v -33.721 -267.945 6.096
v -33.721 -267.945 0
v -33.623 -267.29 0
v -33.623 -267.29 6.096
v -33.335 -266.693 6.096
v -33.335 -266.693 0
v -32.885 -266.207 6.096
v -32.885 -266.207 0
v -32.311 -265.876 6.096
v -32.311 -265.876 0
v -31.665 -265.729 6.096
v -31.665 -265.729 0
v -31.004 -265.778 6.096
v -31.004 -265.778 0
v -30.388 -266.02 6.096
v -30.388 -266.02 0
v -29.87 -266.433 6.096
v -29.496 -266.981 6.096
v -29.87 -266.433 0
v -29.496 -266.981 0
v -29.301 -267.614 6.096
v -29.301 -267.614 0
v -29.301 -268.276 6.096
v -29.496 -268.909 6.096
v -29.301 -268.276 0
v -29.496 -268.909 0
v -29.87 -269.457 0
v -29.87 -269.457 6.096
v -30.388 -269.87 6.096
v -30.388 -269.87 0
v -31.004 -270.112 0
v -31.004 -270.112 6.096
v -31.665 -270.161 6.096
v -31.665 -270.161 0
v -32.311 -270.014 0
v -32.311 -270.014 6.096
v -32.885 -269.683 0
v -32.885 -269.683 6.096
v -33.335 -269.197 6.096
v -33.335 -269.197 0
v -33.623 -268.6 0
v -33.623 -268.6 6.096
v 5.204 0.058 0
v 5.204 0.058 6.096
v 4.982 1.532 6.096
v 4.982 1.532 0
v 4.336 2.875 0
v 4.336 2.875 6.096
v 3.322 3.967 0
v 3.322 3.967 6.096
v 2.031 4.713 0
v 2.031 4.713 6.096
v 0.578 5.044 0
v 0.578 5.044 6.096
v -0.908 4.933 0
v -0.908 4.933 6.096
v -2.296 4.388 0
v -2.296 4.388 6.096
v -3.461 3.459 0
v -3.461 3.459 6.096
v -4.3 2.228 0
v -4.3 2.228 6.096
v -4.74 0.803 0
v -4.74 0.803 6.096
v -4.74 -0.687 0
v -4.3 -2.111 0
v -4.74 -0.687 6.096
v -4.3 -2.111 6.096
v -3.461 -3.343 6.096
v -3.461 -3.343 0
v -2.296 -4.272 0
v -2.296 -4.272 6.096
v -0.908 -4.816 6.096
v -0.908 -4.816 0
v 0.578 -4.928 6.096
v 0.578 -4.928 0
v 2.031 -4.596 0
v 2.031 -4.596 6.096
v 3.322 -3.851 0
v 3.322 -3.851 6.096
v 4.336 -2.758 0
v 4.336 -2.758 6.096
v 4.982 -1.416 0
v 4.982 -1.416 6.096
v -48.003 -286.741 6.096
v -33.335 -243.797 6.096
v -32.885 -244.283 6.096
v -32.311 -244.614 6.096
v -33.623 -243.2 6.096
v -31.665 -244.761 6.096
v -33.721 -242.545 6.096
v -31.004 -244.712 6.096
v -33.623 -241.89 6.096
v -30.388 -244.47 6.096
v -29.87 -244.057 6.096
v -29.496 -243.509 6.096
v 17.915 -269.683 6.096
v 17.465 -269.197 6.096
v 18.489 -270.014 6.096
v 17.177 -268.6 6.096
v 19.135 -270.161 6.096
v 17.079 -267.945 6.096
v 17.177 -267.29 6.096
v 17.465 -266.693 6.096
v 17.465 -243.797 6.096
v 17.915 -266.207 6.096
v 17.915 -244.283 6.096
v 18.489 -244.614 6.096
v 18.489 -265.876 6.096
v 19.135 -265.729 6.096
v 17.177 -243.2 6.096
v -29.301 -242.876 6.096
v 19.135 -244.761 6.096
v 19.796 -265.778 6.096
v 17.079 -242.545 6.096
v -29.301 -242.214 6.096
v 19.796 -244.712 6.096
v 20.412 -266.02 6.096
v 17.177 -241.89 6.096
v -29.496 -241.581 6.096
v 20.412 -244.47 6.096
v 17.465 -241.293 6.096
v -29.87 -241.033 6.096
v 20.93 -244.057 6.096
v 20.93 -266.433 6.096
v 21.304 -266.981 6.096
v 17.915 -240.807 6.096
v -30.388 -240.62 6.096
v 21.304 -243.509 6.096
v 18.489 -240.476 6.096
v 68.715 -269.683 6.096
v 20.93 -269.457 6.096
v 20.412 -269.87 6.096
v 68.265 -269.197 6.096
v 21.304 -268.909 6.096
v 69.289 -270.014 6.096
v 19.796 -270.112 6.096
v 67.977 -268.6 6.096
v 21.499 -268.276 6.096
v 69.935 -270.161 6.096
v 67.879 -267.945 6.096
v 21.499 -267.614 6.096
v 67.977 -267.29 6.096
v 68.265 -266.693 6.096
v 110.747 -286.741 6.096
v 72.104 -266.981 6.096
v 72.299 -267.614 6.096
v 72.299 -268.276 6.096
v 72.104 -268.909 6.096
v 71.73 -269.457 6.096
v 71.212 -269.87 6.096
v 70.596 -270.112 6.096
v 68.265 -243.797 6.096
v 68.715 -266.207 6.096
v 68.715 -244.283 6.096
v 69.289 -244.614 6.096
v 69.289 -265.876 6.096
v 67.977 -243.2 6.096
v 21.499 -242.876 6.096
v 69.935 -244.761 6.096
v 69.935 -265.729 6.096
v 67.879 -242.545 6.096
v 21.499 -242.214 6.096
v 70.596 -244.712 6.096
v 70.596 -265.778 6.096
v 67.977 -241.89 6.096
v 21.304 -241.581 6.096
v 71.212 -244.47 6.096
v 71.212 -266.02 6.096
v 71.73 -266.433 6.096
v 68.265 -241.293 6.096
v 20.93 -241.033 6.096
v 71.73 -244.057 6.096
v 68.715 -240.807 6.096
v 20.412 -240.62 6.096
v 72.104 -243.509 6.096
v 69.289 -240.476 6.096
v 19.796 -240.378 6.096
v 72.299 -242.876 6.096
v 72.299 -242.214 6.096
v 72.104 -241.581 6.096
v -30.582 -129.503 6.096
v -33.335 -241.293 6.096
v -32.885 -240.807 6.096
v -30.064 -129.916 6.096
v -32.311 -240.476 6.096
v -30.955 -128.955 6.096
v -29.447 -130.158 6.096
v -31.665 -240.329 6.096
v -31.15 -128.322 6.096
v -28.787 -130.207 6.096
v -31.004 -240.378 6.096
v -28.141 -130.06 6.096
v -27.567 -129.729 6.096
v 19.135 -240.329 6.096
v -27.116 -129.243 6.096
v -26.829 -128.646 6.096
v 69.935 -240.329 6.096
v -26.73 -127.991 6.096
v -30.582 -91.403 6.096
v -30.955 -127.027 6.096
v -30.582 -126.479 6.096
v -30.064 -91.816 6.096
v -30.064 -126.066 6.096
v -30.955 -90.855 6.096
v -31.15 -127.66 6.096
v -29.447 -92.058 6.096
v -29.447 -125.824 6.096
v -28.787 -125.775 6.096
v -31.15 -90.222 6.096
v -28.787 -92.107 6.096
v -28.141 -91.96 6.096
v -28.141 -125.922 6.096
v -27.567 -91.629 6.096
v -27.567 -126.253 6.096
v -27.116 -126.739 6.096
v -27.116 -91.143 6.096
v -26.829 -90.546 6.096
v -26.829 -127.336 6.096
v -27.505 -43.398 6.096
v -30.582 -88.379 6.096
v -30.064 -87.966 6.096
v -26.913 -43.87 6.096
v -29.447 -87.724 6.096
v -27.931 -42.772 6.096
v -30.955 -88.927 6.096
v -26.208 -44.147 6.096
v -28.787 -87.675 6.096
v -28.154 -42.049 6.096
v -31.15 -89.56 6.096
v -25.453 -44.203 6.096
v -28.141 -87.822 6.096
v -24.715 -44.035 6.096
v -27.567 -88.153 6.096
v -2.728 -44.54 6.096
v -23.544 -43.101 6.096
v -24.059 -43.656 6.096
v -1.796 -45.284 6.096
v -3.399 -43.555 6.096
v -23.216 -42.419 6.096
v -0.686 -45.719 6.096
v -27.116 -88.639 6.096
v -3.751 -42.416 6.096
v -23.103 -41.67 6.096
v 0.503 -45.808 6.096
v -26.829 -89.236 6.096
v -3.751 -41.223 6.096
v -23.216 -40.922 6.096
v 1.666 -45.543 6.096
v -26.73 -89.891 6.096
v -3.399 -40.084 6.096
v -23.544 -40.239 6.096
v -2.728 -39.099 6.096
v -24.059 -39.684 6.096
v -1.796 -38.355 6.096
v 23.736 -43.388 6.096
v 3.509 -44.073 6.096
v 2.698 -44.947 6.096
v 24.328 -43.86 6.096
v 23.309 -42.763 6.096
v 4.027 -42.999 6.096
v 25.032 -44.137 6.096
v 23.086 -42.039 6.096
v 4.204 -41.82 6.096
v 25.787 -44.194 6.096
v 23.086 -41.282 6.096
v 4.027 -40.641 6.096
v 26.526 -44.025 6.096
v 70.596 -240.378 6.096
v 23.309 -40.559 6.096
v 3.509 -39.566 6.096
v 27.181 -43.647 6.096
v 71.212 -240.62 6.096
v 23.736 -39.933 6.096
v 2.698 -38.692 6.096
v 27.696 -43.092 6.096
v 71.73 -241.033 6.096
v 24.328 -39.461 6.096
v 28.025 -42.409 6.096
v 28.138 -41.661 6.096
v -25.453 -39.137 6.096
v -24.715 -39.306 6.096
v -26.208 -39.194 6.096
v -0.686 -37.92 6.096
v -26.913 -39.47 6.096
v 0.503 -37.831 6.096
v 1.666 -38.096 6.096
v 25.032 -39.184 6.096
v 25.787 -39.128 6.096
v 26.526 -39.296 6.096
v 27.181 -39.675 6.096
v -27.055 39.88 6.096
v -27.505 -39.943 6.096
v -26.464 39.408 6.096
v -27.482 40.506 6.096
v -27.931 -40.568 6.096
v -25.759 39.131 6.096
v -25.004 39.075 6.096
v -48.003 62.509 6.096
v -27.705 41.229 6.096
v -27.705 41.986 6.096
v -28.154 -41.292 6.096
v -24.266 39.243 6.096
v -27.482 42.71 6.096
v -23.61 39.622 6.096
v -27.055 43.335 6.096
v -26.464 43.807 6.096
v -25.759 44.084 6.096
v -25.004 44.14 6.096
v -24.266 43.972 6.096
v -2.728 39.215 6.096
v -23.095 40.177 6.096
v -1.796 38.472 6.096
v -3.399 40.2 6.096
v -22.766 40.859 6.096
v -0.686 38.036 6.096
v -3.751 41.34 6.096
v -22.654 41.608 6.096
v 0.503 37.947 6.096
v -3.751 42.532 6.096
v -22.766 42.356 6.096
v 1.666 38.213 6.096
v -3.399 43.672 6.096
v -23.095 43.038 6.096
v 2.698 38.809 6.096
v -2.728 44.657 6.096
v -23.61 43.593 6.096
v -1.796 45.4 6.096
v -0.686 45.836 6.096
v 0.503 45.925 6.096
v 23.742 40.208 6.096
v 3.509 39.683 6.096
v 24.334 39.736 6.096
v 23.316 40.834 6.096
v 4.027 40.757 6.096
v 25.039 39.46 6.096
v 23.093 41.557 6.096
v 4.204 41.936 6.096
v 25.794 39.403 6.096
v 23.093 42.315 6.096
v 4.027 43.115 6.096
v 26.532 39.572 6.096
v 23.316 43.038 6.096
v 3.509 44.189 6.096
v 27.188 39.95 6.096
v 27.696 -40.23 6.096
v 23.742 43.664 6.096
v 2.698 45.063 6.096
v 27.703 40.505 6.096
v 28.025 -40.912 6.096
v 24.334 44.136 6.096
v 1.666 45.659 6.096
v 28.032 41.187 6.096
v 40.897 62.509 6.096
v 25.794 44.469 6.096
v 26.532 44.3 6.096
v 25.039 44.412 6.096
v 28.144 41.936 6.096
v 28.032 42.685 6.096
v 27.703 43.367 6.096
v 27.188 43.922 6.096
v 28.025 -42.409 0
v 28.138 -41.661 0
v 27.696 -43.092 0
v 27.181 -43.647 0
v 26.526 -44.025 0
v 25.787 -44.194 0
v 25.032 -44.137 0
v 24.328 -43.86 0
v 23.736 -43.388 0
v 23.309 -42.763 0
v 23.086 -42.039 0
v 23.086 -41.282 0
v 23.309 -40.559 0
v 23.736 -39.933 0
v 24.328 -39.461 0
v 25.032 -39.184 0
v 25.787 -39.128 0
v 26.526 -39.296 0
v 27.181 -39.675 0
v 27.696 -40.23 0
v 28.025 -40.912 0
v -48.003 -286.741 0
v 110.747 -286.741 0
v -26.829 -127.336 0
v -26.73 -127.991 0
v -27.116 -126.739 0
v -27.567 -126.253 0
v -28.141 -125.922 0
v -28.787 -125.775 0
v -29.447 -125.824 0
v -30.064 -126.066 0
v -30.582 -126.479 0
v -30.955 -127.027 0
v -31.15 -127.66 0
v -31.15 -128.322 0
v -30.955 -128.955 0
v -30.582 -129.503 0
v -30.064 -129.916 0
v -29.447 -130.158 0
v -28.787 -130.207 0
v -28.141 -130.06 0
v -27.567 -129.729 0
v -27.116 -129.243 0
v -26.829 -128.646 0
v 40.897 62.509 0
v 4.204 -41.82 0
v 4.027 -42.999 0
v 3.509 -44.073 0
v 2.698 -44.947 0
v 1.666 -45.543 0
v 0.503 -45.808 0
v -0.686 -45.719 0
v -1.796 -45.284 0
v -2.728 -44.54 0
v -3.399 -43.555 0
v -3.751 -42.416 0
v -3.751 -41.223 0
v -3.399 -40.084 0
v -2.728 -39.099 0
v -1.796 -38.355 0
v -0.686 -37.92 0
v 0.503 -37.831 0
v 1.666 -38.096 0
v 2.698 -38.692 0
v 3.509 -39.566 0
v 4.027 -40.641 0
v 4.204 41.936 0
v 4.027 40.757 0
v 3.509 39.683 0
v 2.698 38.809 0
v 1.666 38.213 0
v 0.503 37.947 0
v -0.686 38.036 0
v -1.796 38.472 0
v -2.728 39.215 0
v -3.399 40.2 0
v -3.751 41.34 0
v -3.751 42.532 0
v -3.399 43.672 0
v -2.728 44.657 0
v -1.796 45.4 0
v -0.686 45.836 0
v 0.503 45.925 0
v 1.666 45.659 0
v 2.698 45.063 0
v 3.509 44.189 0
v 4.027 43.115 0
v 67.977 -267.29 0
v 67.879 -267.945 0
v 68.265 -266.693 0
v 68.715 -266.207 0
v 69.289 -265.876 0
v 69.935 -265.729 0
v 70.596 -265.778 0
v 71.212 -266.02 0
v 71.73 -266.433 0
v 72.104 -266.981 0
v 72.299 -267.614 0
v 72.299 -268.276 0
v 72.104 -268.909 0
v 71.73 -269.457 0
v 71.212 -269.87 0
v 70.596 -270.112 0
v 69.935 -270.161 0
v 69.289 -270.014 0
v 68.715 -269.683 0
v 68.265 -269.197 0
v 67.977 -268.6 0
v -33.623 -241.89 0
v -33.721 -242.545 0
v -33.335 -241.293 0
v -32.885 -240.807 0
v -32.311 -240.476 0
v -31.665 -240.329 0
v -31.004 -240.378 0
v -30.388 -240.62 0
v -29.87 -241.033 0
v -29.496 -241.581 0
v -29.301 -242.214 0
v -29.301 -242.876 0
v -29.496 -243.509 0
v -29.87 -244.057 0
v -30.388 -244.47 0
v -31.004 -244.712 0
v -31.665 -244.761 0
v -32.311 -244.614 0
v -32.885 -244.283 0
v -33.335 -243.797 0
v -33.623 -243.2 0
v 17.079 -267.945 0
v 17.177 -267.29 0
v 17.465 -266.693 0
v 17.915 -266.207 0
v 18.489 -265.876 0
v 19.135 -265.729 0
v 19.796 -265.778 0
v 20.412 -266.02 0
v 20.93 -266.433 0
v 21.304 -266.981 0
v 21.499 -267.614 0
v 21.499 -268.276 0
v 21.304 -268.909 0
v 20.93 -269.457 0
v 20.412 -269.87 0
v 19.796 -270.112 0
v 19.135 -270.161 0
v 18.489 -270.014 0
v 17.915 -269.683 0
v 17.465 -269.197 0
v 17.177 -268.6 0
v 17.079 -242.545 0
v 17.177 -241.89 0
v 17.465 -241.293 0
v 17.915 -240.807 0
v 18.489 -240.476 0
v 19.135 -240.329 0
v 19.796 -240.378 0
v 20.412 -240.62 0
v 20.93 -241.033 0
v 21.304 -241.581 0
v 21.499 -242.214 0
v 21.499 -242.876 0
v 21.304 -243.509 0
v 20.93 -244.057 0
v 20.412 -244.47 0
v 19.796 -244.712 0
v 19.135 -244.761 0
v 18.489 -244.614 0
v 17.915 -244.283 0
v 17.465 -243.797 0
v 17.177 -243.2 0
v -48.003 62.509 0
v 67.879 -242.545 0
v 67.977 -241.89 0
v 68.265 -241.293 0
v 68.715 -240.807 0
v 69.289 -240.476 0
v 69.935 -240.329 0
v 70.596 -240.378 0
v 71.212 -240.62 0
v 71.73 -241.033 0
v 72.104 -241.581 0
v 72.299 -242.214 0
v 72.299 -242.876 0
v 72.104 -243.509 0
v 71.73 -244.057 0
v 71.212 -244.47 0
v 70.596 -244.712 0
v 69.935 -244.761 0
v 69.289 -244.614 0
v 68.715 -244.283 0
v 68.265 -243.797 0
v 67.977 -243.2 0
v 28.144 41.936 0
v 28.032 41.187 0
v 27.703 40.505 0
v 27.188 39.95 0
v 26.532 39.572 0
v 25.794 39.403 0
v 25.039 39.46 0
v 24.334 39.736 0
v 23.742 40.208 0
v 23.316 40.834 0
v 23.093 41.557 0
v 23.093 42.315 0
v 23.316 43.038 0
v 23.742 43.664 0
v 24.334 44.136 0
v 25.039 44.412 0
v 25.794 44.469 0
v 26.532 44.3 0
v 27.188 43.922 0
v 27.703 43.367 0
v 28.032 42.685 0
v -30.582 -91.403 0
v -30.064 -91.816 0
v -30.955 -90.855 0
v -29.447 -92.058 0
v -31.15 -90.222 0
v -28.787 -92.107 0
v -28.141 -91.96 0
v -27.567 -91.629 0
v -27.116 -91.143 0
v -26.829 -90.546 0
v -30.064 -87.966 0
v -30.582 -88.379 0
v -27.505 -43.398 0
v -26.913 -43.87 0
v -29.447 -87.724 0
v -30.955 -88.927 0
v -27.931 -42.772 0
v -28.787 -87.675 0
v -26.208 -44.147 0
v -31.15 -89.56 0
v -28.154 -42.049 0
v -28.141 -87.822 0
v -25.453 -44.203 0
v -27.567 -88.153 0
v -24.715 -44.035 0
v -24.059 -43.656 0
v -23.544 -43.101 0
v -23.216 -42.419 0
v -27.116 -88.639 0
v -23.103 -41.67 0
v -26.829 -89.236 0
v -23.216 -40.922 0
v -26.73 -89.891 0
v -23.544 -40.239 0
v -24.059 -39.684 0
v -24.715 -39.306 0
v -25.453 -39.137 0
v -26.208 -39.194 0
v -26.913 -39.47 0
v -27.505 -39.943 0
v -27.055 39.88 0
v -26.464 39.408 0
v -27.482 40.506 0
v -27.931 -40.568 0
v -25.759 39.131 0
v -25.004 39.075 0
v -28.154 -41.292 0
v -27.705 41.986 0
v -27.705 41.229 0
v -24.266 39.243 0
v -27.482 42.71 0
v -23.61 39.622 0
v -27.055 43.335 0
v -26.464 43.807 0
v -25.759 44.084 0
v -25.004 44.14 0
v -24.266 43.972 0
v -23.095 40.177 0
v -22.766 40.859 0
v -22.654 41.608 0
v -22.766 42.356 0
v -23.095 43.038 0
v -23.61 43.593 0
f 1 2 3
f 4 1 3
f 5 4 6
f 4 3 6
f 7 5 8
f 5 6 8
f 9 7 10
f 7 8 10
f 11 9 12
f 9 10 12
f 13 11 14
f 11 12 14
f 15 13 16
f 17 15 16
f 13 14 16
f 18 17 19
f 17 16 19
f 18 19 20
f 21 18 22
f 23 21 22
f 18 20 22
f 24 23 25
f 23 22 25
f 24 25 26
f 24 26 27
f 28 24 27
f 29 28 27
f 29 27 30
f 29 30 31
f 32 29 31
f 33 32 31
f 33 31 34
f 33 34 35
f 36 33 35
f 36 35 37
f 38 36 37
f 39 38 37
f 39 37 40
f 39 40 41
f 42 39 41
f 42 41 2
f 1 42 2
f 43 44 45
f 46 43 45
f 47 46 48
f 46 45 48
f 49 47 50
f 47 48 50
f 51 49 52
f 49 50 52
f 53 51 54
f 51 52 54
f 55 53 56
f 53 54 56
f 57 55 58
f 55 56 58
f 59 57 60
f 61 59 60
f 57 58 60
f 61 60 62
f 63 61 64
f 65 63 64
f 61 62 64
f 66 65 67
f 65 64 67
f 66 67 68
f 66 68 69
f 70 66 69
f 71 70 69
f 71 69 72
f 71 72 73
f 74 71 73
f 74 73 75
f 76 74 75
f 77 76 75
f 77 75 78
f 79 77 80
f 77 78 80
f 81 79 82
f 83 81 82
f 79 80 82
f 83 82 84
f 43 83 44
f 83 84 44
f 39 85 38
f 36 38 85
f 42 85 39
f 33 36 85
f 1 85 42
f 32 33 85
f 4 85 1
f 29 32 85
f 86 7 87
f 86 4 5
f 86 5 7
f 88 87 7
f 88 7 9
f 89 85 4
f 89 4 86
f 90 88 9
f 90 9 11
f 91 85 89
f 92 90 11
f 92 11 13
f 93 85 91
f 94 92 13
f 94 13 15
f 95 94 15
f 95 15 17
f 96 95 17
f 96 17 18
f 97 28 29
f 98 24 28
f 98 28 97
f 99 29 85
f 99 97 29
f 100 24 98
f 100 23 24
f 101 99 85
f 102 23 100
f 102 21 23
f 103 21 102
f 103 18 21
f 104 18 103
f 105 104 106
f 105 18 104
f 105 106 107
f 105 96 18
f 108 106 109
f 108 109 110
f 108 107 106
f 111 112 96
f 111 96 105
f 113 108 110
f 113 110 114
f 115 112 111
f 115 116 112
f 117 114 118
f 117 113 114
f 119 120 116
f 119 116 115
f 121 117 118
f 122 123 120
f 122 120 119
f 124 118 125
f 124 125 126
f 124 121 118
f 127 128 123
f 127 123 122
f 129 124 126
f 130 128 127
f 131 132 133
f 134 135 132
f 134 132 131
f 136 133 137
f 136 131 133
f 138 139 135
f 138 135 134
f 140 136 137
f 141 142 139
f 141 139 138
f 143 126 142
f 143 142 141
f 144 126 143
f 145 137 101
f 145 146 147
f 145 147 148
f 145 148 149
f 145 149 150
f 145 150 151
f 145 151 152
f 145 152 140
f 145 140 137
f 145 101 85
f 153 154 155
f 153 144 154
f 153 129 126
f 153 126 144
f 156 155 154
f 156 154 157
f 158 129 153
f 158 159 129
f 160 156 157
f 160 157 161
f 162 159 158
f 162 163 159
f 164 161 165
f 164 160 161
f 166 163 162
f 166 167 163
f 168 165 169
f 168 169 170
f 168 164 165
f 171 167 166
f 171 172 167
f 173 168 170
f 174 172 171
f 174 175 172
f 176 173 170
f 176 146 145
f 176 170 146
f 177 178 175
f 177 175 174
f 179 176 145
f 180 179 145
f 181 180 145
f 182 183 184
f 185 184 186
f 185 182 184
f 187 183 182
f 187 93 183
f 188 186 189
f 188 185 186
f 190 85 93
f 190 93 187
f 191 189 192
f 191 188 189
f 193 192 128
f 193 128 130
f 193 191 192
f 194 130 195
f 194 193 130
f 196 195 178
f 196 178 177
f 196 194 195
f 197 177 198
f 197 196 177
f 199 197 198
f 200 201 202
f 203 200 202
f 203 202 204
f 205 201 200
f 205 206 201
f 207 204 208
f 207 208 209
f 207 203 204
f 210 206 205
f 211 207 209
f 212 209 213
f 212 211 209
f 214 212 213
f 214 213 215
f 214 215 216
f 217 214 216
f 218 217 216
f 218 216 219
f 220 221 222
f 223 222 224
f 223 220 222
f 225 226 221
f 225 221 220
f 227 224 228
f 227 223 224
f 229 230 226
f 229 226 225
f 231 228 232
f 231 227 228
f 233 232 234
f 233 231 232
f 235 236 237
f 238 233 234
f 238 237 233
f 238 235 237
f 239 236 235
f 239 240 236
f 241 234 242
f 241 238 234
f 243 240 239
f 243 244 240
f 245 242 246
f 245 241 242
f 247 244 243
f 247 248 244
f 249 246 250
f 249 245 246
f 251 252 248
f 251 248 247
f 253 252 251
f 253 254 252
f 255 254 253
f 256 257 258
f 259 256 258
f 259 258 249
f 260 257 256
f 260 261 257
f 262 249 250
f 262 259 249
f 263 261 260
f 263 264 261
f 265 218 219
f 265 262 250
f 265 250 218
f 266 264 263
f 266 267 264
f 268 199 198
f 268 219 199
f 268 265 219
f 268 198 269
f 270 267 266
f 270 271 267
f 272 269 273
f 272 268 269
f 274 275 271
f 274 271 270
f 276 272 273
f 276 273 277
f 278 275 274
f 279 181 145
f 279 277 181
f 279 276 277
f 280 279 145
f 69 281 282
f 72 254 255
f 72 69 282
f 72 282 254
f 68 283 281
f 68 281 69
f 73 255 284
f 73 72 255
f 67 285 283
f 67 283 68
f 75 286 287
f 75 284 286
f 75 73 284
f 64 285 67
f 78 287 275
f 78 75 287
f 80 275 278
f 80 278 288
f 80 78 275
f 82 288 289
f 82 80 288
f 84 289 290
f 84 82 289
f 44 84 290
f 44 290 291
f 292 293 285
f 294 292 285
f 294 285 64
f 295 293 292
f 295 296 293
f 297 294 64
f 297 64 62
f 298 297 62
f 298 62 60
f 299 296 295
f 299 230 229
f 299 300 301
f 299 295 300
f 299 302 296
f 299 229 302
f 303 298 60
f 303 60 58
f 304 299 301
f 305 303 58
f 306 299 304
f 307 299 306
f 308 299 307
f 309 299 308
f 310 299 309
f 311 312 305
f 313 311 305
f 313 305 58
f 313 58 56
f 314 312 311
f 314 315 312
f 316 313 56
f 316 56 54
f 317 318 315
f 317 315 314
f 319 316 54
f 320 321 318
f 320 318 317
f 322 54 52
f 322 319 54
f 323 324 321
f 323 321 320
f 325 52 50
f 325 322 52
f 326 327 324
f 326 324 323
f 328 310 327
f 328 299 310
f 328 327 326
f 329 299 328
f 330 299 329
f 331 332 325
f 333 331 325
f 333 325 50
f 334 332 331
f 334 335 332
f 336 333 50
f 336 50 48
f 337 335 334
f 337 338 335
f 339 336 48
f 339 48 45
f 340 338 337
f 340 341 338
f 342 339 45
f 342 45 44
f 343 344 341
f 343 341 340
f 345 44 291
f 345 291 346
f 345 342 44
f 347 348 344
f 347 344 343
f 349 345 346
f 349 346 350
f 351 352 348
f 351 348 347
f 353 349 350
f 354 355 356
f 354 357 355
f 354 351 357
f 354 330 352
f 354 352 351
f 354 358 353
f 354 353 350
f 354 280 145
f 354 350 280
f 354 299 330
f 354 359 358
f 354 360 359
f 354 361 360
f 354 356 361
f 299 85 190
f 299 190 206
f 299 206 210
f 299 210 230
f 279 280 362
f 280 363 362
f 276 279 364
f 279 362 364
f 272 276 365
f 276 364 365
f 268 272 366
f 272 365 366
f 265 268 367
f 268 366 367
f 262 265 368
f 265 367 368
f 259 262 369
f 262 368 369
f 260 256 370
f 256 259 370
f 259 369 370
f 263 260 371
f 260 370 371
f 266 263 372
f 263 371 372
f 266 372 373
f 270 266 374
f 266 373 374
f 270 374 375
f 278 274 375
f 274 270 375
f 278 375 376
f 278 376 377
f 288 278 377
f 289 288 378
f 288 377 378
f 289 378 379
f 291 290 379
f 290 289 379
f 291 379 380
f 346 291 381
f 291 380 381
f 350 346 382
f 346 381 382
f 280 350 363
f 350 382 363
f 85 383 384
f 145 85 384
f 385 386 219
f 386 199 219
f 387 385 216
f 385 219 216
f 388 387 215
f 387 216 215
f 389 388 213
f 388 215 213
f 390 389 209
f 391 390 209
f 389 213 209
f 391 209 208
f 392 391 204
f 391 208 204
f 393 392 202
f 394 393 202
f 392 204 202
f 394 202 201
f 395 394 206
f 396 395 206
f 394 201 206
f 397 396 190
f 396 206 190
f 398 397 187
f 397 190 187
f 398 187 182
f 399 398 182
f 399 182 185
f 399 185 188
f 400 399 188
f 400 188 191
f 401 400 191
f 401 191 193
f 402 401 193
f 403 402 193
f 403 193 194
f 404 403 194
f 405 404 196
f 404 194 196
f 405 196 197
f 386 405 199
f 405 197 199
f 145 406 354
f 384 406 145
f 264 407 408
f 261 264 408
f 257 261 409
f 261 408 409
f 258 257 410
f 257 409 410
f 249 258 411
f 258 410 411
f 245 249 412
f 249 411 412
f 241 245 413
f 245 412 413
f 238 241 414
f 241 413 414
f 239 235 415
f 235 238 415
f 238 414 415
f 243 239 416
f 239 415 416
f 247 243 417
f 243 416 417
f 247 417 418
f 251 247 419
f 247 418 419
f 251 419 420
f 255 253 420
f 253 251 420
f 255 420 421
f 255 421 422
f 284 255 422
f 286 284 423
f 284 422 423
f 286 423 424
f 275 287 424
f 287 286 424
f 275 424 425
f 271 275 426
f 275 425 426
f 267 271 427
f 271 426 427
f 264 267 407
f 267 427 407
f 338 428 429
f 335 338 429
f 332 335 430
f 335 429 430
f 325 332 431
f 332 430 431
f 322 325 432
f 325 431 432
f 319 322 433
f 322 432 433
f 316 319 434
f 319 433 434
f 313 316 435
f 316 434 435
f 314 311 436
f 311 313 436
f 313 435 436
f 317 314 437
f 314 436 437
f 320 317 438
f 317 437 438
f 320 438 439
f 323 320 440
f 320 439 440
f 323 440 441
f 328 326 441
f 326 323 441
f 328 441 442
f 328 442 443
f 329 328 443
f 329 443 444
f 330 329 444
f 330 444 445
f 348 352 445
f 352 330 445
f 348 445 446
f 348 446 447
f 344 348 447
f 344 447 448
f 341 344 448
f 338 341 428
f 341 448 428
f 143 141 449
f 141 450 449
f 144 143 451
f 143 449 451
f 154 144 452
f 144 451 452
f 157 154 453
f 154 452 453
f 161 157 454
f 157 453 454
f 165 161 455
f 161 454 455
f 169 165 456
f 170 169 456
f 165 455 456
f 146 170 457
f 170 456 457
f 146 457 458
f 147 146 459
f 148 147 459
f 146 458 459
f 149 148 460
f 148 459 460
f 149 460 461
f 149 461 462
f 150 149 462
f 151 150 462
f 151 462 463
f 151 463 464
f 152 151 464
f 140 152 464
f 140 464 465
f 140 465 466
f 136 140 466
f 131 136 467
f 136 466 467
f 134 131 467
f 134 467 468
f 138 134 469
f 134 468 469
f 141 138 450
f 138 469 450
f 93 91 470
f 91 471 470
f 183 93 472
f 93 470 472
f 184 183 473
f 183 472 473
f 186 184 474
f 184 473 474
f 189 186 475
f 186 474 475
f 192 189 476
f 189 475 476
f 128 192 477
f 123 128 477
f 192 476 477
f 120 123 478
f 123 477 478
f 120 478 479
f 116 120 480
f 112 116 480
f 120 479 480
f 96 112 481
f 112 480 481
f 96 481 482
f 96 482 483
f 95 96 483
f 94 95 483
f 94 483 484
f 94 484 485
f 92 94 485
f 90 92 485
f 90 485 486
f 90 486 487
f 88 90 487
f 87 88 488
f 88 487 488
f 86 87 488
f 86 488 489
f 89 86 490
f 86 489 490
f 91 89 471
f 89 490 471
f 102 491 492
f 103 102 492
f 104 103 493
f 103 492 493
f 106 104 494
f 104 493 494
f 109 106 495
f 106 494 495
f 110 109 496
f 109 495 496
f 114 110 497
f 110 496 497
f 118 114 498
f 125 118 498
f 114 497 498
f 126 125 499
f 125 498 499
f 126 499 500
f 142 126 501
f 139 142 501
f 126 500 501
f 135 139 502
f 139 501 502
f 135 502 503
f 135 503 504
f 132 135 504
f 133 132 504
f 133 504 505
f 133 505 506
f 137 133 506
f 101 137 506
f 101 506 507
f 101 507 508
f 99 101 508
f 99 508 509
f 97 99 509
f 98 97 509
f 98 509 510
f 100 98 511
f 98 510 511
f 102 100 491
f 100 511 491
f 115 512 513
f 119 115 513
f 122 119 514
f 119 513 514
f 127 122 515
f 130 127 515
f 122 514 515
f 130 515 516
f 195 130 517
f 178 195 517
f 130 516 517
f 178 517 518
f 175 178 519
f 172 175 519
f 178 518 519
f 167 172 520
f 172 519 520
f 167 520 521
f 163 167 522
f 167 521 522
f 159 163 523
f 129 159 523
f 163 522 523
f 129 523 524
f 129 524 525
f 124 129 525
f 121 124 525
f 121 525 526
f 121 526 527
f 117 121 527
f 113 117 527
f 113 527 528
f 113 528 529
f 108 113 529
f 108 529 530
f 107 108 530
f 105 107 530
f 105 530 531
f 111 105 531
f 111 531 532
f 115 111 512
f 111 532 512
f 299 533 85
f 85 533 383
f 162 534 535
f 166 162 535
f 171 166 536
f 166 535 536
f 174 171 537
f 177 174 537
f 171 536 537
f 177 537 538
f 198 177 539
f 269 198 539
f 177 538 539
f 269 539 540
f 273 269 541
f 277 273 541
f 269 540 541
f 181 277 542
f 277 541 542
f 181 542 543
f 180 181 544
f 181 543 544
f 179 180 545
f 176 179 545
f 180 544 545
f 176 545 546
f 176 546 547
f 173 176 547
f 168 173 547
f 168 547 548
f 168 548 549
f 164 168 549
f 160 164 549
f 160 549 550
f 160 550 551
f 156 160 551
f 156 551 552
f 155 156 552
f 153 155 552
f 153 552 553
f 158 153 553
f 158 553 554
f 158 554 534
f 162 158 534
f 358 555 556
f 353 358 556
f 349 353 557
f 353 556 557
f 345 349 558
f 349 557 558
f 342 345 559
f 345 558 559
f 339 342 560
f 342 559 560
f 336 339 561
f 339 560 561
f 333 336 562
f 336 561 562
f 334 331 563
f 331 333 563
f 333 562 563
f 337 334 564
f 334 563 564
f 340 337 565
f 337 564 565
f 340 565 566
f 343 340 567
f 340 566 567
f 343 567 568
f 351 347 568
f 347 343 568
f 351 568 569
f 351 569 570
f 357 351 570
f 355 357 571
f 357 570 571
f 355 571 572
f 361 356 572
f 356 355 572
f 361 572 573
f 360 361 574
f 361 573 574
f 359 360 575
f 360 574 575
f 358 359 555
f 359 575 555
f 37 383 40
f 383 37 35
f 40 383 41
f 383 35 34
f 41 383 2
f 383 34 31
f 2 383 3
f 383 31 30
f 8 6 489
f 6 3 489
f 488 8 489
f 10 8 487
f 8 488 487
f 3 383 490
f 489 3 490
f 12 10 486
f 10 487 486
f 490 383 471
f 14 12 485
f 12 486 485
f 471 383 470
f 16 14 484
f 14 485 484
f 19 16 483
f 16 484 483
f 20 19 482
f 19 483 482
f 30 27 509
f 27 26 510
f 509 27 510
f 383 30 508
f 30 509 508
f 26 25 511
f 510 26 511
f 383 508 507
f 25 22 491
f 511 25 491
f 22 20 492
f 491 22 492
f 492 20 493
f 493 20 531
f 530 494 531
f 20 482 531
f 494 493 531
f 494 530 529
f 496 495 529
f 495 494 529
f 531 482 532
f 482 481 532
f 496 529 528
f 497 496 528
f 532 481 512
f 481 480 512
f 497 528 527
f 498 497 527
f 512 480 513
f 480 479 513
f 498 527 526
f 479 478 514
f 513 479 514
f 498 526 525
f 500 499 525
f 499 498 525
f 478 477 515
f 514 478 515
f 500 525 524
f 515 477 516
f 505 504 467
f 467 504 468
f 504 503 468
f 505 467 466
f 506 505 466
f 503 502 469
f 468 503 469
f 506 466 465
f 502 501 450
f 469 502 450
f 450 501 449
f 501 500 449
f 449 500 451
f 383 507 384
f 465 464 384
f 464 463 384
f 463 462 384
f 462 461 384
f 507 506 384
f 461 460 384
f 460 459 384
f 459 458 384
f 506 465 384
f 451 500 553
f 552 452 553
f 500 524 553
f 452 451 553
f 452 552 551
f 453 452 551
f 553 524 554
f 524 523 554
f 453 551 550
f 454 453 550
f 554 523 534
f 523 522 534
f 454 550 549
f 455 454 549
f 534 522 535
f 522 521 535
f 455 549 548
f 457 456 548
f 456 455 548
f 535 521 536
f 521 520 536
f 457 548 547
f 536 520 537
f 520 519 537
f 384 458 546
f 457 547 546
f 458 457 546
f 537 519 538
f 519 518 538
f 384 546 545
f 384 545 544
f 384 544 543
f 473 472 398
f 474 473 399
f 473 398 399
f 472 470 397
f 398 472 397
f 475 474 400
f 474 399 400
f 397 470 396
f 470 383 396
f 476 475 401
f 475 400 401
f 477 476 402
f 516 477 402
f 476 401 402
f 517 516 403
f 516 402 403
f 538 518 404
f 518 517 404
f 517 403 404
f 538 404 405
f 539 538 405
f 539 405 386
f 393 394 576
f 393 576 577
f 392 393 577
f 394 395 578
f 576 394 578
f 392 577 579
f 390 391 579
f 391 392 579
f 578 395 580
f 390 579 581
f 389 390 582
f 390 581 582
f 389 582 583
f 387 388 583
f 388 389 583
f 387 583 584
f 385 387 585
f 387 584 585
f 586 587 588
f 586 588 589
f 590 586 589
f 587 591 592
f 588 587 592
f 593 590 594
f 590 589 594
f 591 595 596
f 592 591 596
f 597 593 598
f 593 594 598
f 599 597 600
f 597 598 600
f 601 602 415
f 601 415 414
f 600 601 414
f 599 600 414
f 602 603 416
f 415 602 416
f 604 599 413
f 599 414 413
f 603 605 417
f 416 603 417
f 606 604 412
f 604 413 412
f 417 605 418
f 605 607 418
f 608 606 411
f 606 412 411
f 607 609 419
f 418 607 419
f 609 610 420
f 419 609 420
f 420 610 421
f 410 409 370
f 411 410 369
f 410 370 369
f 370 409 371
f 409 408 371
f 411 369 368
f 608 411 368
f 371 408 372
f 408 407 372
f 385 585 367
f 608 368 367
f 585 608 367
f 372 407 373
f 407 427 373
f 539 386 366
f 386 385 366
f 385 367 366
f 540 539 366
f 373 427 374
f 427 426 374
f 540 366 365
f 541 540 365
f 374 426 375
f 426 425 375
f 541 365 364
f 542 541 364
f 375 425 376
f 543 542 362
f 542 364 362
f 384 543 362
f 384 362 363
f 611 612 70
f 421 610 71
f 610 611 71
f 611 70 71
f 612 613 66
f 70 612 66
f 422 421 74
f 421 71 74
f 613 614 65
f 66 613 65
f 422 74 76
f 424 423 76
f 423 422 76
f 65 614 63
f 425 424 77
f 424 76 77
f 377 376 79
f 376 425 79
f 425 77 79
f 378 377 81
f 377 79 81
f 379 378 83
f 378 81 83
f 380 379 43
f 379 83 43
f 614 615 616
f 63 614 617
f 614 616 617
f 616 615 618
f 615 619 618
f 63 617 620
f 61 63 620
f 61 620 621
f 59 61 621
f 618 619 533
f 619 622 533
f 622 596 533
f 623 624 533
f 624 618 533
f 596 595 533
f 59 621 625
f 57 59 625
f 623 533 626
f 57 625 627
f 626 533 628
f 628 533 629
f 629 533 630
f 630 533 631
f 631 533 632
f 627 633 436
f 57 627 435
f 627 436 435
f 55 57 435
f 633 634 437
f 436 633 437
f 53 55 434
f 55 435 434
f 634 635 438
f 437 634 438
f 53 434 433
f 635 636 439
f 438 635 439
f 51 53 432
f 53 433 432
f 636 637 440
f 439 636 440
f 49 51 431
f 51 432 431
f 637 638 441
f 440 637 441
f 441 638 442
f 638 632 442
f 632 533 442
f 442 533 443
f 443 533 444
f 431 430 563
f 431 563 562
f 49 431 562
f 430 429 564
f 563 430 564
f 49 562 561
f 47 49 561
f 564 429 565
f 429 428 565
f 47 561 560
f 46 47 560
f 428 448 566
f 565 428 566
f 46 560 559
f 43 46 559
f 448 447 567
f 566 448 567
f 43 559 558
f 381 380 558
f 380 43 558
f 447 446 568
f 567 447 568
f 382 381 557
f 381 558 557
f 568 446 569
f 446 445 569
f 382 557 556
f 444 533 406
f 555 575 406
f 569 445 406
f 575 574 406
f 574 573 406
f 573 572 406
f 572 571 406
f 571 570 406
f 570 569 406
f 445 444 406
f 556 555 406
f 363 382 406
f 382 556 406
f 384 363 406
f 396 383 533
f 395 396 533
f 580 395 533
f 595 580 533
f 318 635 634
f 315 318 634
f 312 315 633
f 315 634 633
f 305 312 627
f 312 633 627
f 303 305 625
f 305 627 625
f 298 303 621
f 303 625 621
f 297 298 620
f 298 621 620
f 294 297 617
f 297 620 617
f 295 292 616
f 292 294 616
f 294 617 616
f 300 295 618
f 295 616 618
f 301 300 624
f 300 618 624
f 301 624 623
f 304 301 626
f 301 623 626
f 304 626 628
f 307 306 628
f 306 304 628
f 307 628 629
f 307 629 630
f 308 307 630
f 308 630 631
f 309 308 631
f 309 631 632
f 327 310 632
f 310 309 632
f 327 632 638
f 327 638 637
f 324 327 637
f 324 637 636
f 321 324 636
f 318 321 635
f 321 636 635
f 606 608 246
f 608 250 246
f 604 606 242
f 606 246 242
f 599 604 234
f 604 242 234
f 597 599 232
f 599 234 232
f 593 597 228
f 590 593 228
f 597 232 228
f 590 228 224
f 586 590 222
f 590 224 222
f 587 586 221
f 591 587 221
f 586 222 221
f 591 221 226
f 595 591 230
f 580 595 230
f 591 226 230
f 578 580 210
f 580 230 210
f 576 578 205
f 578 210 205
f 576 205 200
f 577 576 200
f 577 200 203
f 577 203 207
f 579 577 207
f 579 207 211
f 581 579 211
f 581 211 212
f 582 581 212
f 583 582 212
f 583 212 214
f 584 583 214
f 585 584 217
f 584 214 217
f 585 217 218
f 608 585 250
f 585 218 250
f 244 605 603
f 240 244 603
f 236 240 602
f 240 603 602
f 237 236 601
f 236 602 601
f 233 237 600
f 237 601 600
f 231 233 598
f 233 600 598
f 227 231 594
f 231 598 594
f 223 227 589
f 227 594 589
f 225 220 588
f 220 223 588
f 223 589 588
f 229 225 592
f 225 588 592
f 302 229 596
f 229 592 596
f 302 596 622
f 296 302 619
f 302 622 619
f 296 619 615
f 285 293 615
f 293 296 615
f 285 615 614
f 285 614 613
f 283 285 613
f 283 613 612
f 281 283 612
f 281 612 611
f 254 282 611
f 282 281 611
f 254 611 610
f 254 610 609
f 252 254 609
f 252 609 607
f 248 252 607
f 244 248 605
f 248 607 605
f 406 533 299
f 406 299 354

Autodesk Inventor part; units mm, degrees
ref_plane "YZ Plane" through (0, 0, 0) normal (1, 0, 0) x (0, 1, 0)
ref_plane "XZ Plane" through (0, 0, 0) normal (0, 1, 0) x (-1, 0, 0)
ref_plane "XY Plane" through (0, 0, 0) normal (0, 0, 1) x (1, 0, 0)
ref_plane "Work Plane1" through (-0.1788, 0, 0) normal (0, 0, 1) x (1, 0, 0)
sketch "Sketch1" plane through (-0.1788, 0, 0) normal (0, 0, 1) x (1, 0, 0)
  line L0 (-15.3244, 3.4987) -> (-19.1223, 3.4987) projected
  line L1 (-19.1223, 3.4987) -> (-28.8529, 35.0248) projected
  arc A0 (-28.8529, 35.0248) -> (-20.5467, 47.7802) centre (-25.0147, 41.6076) ccw projected
  line L2 (-20.5467, 47.7802) -> (-6.566, 47.7802) projected
  arc A1 (-6.566, 47.7802) -> (-2.0556, 33.1897) centre (0.3832, 41.936) ccw projected
  line L3 (-2.0556, 33.1897) -> (-2.0556, 15.9522) projected
  arc A2 (-2.0556, 15.9522) -> (-15.3244, 3.4987) centre (0.3832, 0.0582) ccw projected
  arc A3 (20.8934, 47.7802) -> (21.5632, 35.5913) centre (25.7832, 41.936) ccw projected
  line L4 (21.5632, 35.5913) -> (21.5632, 4.0758) projected
  line L5 (21.5632, 4.0758) -> (15.9532, 4.0758) projected
  arc A4 (15.9532, 4.0758) -> (1.9969, 16.0571) centre (0.3832, 0.0582) ccw projected
  line L6 (1.9969, 16.0571) -> (1.9969, 33.0006) projected
  arc A5 (1.9969, 33.0006) -> (7.3324, 47.7802) centre (0.3832, 41.936) ccw projected
  line L7 (7.3324, 47.7802) -> (20.8934, 47.7802) projected
  arc A6 (21.5632, -35.3114) -> (21.3082, -47.8332) centre (25.7764, -41.6607) ccw projected
  line L8 (21.3082, -47.8332) -> (7.1864, -47.8332) projected
  arc A7 (7.1864, -47.8332) -> (1.9969, -32.8841) centre (0.3832, -41.8196) ccw projected
  line L9 (1.9969, -32.8841) -> (1.9969, -15.9406) projected
  arc A8 (1.9969, -15.9406) -> (16.068, -3.4851) centre (0.3832, 0.0582) ccw projected
  line L10 (16.068, -3.4851) -> (21.5632, -3.4851) projected
  line L11 (21.5632, -3.4851) -> (21.5632, -35.3114) projected
  arc A9 (-20.9828, -47.8332) -> (-29.9021, -35.476) centre (-25.464, -41.6702) ccw projected
  line L12 (-29.9021, -35.476) -> (-19.2115, -3.4851) projected
  line L13 (-19.2115, -3.4851) -> (-15.3016, -3.4851) projected
  arc A10 (-15.3016, -3.4851) -> (-2.0556, -15.8358) centre (0.3832, 0.0582) ccw projected
  line L14 (-2.0556, -15.8358) -> (-2.0556, -33.0732) projected
  arc A11 (-2.0556, -33.0732) -> (-6.4199, -47.8332) centre (0.3832, -41.8196) ccw projected
  line L15 (-6.4199, -47.8332) -> (-20.9828, -47.8332) projected
  circle A12 centre (0.3832, 0.0582) radius 11 projected
  circle A13 centre (0.3832, -41.8196) radius 4 projected
  circle A14 centre (0.3832, 41.936) radius 4 projected
  circle A15 centre (-25.464, -41.6702) radius 2.54 projected
  circle A16 centre (-25.0147, 41.6076) radius 2.54 projected
  circle A17 centre (25.7764, -41.6607) radius 2.54 projected
  circle A18 centre (25.7832, 41.936) radius 2.54 projected
  arc A19 (25.7764, 31.8658) -> (25.2733, 51.9934) centre (25.7832, 41.936) ccw projected
  line L16 (25.2733, 51.9934) -> (-25.0147, 51.9934) projected
  arc A20 (-25.0147, 51.9934) -> (-35.3953, 41.9358) centre (-25.0147, 41.6076) ccw projected
  line L17 (-35.3953, 41.9358) -> (-22.4697, 0.058) projected
  line L18 (-22.4697, 0.058) -> (-35.3142, -38.3784) projected
  arc A21 (-35.3142, -38.3784) -> (-25.0214, -52.0464) centre (-25.464, -41.6702) ccw projected
  line L19 (-25.0214, -52.0464) -> (25.7764, -52.0464) projected
  arc A22 (25.7764, -52.0464) -> (25.7764, -31.275) centre (25.7764, -41.6607) ccw projected
  line L20 (25.7764, -31.275) -> (25.7764, 31.8658) projected
  line L21 (0.1293, 51.9934) -> (0.1293, 62.509)
  line L22 (-35.3953, 41.9358) -> (-48.0953, 41.9358)
  line L23 (-47.8239, 62.509) -> (41.0761, 62.509)
  line L24 (41.0761, 62.509) -> (110.9261, -286.741)
  line L25 (-47.8239, 62.509) -> (-47.8239, -286.741)
  line L26 (-47.8239, -286.741) -> (110.9261, -286.741)
  point P0 (0.1788, 0)
  dimension "d0" = 10.5156
  dimension "d1" = 12.7
  dimension "d4" = 88.9
  dimension "d10" = 349.25
extrude "Extrusion1" add sketch "Sketch1" along normal blind 6.096 contours L0 L1 A0 L2 A1 L3 A2 | A3 L4 L5 A4 L6 A5 L7 | A6 L8 A7 L9 A8 L10 L11 | A9 L12 L13 A10 L14 A11 L15 | A12 | L20 A22 L19 A21 L18 L17 A20 L16 A19 | A19 L16 L21 L23 L24 L26 L25 L22 L17 L18 A21 L19 A22 L20 | L16 A20 L22 L25 L23 L21
sketch "Sketch2" plane through (-0.1788, 0, 6.096) normal (0, 0, 1) x (1, 0, 0)
  circle A0 centre (0.3832, 0.0582) radius 5 projected
  point P0 (0.1788, 0)
extrude "Extrusion2" cut sketch "Sketch2" against normal blind 25.4
sketch "Sketch3" plane through (-0.1788, 0, 0) normal (0, 0, -1) x (-1, 0, 0)
  circle A0 centre (-0.3832, 0.0582) radius 5 projected
  circle A1 centre (-0.3832, 41.936) radius 4 projected
  circle A2 centre (-0.3832, -41.8196) radius 4 projected
  circle A3 centre (-25.7832, 41.936) radius 2.54 projected
  circle A4 centre (-25.7764, -41.6607) radius 2.54 projected
  circle A5 centre (25.0147, 41.6076) radius 2.54 projected
  circle A6 centre (25.464, -41.6702) radius 2.54 projected
  line L0 (47.8239, 62.509) -> (-41.0761, 62.509) projected
  line L1 (-41.0761, 62.509) -> (-110.9261, -286.741) projected
  line L2 (-110.9261, -286.741) -> (47.8239, -286.741) projected
  line L3 (47.8239, -286.741) -> (47.8239, 62.509) projected
  line L4 (82.12, -280.645) -> (-254.43, -280.645)
  line L5 (-72.5025, -280.645) -> (-68.0575, -280.645)
  line L6 (-21.7025, -280.645) -> (-17.2575, -280.645)
  line L7 (29.0975, -280.645) -> (33.5425, -280.645)
  line L8 (-70.28, -280.645) -> (-70.28, -267.945)
  line L9 (-70.28, -267.945) -> (-19.48, -267.945)
  line L10 (-19.48, -267.945) -> (31.32, -267.945)
  line L11 (31.32, -267.945) -> (31.32, -242.545)
  circle A7 centre (-70.28, -267.945) radius 2.2225
  circle A8 centre (-19.48, -267.945) radius 2.2225
  circle A9 centre (31.32, -267.945) radius 2.2225
  circle A10 centre (31.32, -242.545) radius 2.2225
  circle A11 centre (-19.48, -242.545) radius 2.2225
  circle A12 centre (-70.28, -242.545) radius 2.2225
  point P0 (-0.1788, 0)
  dimension "d11" = 12.7
  dimension "d12" = 25.4
  dimension "d13" = 4.445
  dimension "d14" = 4.445
  dimension "d15" = 4.445
  dimension "d16" = 4.445
  dimension "d17" = 4.445
  dimension "d18" = 4.445
extrude "Extrusion3" cut sketch "Sketch3" against normal blind 25.4 contours A10 | A9 L11 L10 | L10 L11 A9 | A8 L10 L9 | L9 L10 A8 | A7 L9 L8 | L8 L9 A7 | A11 | A12
sketch "Sketch4" plane through (-0.1788, 0, 0) normal (0, 0, -1) x (-1, 0, 0)
  circle A0 centre (-19.48, -242.545) radius 2.2225 projected
  circle A1 centre (31.32, -267.945) radius 2.2225 projected
  circle A2 centre (-70.28, -267.945) radius 2.2225 projected
  circle A3 centre (-19.48, -267.945) radius 2.2225 projected
  circle A4 centre (31.32, -242.545) radius 2.2225 projected
  circle A5 centre (-70.28, -242.545) radius 2.2225 projected
  circle A6 centre (-0.3832, 0.0582) radius 5 projected
  circle A7 centre (-0.3832, 41.936) radius 4 projected
  circle A8 centre (-0.3832, -41.8196) radius 4 projected
  circle A9 centre (-25.7832, 41.936) radius 2.54 projected
  circle A10 centre (-25.7764, -41.6607) radius 2.54 projected
  circle A11 centre (25.0147, 41.6076) radius 2.54 projected
  circle A12 centre (25.464, -41.6702) radius 2.54 projected
  line L0 (47.8239, 62.509) -> (-41.0761, 62.509) projected
  line L1 (-41.0761, 62.509) -> (-110.9261, -286.741) projected
  line L2 (-110.9261, -286.741) -> (47.8239, -286.741) projected
  line L3 (47.8239, -286.741) -> (47.8239, 62.509) projected
  point P0 (-0.1788, 0)
sketch "Sketch5" plane through (-0.1788, 0, 6.096) normal (0, 0, 1) x (1, 0, 0)
  circle A0 centre (0.3832, -41.8196) radius 4 projected
  line L0 (0.3832, -41.8196) -> (0.3832, -118.0196)
  point P0 (0.1788, 0)
  dimension "d21" = 76.2
sketch "Sketch6" plane through (-0.1788, 0, 6.096) normal (0, 0, 1) x (1, 0, 0)
  line L0 (41.0761, 62.509) -> (-47.8239, 62.509) projected
  line L1 (-47.8239, 62.509) -> (-47.8239, -89.891)
  line L2 (-47.8239, 62.509) -> (-47.8239, -286.741) projected
  line L3 (-47.8239, -89.891) -> (-28.7739, -89.891)
  line L4 (-28.7739, -89.891) -> (-28.7739, -127.991)
  circle A0 centre (-28.7739, -89.891) radius 2.2225
  circle A1 centre (-28.7739, -127.991) radius 2.2225
  point P0 (0.1788, 0)
  dimension "d22" = 152.4
  dimension "d23" = 19.05
  dimension "d24" = 38.1
  dimension "d25" = 4.445
  dimension "d26" = 4.445
extrude "Extrusion4" cut sketch "Sketch6" against normal blind 25.4
properties part number "Side Walls"
